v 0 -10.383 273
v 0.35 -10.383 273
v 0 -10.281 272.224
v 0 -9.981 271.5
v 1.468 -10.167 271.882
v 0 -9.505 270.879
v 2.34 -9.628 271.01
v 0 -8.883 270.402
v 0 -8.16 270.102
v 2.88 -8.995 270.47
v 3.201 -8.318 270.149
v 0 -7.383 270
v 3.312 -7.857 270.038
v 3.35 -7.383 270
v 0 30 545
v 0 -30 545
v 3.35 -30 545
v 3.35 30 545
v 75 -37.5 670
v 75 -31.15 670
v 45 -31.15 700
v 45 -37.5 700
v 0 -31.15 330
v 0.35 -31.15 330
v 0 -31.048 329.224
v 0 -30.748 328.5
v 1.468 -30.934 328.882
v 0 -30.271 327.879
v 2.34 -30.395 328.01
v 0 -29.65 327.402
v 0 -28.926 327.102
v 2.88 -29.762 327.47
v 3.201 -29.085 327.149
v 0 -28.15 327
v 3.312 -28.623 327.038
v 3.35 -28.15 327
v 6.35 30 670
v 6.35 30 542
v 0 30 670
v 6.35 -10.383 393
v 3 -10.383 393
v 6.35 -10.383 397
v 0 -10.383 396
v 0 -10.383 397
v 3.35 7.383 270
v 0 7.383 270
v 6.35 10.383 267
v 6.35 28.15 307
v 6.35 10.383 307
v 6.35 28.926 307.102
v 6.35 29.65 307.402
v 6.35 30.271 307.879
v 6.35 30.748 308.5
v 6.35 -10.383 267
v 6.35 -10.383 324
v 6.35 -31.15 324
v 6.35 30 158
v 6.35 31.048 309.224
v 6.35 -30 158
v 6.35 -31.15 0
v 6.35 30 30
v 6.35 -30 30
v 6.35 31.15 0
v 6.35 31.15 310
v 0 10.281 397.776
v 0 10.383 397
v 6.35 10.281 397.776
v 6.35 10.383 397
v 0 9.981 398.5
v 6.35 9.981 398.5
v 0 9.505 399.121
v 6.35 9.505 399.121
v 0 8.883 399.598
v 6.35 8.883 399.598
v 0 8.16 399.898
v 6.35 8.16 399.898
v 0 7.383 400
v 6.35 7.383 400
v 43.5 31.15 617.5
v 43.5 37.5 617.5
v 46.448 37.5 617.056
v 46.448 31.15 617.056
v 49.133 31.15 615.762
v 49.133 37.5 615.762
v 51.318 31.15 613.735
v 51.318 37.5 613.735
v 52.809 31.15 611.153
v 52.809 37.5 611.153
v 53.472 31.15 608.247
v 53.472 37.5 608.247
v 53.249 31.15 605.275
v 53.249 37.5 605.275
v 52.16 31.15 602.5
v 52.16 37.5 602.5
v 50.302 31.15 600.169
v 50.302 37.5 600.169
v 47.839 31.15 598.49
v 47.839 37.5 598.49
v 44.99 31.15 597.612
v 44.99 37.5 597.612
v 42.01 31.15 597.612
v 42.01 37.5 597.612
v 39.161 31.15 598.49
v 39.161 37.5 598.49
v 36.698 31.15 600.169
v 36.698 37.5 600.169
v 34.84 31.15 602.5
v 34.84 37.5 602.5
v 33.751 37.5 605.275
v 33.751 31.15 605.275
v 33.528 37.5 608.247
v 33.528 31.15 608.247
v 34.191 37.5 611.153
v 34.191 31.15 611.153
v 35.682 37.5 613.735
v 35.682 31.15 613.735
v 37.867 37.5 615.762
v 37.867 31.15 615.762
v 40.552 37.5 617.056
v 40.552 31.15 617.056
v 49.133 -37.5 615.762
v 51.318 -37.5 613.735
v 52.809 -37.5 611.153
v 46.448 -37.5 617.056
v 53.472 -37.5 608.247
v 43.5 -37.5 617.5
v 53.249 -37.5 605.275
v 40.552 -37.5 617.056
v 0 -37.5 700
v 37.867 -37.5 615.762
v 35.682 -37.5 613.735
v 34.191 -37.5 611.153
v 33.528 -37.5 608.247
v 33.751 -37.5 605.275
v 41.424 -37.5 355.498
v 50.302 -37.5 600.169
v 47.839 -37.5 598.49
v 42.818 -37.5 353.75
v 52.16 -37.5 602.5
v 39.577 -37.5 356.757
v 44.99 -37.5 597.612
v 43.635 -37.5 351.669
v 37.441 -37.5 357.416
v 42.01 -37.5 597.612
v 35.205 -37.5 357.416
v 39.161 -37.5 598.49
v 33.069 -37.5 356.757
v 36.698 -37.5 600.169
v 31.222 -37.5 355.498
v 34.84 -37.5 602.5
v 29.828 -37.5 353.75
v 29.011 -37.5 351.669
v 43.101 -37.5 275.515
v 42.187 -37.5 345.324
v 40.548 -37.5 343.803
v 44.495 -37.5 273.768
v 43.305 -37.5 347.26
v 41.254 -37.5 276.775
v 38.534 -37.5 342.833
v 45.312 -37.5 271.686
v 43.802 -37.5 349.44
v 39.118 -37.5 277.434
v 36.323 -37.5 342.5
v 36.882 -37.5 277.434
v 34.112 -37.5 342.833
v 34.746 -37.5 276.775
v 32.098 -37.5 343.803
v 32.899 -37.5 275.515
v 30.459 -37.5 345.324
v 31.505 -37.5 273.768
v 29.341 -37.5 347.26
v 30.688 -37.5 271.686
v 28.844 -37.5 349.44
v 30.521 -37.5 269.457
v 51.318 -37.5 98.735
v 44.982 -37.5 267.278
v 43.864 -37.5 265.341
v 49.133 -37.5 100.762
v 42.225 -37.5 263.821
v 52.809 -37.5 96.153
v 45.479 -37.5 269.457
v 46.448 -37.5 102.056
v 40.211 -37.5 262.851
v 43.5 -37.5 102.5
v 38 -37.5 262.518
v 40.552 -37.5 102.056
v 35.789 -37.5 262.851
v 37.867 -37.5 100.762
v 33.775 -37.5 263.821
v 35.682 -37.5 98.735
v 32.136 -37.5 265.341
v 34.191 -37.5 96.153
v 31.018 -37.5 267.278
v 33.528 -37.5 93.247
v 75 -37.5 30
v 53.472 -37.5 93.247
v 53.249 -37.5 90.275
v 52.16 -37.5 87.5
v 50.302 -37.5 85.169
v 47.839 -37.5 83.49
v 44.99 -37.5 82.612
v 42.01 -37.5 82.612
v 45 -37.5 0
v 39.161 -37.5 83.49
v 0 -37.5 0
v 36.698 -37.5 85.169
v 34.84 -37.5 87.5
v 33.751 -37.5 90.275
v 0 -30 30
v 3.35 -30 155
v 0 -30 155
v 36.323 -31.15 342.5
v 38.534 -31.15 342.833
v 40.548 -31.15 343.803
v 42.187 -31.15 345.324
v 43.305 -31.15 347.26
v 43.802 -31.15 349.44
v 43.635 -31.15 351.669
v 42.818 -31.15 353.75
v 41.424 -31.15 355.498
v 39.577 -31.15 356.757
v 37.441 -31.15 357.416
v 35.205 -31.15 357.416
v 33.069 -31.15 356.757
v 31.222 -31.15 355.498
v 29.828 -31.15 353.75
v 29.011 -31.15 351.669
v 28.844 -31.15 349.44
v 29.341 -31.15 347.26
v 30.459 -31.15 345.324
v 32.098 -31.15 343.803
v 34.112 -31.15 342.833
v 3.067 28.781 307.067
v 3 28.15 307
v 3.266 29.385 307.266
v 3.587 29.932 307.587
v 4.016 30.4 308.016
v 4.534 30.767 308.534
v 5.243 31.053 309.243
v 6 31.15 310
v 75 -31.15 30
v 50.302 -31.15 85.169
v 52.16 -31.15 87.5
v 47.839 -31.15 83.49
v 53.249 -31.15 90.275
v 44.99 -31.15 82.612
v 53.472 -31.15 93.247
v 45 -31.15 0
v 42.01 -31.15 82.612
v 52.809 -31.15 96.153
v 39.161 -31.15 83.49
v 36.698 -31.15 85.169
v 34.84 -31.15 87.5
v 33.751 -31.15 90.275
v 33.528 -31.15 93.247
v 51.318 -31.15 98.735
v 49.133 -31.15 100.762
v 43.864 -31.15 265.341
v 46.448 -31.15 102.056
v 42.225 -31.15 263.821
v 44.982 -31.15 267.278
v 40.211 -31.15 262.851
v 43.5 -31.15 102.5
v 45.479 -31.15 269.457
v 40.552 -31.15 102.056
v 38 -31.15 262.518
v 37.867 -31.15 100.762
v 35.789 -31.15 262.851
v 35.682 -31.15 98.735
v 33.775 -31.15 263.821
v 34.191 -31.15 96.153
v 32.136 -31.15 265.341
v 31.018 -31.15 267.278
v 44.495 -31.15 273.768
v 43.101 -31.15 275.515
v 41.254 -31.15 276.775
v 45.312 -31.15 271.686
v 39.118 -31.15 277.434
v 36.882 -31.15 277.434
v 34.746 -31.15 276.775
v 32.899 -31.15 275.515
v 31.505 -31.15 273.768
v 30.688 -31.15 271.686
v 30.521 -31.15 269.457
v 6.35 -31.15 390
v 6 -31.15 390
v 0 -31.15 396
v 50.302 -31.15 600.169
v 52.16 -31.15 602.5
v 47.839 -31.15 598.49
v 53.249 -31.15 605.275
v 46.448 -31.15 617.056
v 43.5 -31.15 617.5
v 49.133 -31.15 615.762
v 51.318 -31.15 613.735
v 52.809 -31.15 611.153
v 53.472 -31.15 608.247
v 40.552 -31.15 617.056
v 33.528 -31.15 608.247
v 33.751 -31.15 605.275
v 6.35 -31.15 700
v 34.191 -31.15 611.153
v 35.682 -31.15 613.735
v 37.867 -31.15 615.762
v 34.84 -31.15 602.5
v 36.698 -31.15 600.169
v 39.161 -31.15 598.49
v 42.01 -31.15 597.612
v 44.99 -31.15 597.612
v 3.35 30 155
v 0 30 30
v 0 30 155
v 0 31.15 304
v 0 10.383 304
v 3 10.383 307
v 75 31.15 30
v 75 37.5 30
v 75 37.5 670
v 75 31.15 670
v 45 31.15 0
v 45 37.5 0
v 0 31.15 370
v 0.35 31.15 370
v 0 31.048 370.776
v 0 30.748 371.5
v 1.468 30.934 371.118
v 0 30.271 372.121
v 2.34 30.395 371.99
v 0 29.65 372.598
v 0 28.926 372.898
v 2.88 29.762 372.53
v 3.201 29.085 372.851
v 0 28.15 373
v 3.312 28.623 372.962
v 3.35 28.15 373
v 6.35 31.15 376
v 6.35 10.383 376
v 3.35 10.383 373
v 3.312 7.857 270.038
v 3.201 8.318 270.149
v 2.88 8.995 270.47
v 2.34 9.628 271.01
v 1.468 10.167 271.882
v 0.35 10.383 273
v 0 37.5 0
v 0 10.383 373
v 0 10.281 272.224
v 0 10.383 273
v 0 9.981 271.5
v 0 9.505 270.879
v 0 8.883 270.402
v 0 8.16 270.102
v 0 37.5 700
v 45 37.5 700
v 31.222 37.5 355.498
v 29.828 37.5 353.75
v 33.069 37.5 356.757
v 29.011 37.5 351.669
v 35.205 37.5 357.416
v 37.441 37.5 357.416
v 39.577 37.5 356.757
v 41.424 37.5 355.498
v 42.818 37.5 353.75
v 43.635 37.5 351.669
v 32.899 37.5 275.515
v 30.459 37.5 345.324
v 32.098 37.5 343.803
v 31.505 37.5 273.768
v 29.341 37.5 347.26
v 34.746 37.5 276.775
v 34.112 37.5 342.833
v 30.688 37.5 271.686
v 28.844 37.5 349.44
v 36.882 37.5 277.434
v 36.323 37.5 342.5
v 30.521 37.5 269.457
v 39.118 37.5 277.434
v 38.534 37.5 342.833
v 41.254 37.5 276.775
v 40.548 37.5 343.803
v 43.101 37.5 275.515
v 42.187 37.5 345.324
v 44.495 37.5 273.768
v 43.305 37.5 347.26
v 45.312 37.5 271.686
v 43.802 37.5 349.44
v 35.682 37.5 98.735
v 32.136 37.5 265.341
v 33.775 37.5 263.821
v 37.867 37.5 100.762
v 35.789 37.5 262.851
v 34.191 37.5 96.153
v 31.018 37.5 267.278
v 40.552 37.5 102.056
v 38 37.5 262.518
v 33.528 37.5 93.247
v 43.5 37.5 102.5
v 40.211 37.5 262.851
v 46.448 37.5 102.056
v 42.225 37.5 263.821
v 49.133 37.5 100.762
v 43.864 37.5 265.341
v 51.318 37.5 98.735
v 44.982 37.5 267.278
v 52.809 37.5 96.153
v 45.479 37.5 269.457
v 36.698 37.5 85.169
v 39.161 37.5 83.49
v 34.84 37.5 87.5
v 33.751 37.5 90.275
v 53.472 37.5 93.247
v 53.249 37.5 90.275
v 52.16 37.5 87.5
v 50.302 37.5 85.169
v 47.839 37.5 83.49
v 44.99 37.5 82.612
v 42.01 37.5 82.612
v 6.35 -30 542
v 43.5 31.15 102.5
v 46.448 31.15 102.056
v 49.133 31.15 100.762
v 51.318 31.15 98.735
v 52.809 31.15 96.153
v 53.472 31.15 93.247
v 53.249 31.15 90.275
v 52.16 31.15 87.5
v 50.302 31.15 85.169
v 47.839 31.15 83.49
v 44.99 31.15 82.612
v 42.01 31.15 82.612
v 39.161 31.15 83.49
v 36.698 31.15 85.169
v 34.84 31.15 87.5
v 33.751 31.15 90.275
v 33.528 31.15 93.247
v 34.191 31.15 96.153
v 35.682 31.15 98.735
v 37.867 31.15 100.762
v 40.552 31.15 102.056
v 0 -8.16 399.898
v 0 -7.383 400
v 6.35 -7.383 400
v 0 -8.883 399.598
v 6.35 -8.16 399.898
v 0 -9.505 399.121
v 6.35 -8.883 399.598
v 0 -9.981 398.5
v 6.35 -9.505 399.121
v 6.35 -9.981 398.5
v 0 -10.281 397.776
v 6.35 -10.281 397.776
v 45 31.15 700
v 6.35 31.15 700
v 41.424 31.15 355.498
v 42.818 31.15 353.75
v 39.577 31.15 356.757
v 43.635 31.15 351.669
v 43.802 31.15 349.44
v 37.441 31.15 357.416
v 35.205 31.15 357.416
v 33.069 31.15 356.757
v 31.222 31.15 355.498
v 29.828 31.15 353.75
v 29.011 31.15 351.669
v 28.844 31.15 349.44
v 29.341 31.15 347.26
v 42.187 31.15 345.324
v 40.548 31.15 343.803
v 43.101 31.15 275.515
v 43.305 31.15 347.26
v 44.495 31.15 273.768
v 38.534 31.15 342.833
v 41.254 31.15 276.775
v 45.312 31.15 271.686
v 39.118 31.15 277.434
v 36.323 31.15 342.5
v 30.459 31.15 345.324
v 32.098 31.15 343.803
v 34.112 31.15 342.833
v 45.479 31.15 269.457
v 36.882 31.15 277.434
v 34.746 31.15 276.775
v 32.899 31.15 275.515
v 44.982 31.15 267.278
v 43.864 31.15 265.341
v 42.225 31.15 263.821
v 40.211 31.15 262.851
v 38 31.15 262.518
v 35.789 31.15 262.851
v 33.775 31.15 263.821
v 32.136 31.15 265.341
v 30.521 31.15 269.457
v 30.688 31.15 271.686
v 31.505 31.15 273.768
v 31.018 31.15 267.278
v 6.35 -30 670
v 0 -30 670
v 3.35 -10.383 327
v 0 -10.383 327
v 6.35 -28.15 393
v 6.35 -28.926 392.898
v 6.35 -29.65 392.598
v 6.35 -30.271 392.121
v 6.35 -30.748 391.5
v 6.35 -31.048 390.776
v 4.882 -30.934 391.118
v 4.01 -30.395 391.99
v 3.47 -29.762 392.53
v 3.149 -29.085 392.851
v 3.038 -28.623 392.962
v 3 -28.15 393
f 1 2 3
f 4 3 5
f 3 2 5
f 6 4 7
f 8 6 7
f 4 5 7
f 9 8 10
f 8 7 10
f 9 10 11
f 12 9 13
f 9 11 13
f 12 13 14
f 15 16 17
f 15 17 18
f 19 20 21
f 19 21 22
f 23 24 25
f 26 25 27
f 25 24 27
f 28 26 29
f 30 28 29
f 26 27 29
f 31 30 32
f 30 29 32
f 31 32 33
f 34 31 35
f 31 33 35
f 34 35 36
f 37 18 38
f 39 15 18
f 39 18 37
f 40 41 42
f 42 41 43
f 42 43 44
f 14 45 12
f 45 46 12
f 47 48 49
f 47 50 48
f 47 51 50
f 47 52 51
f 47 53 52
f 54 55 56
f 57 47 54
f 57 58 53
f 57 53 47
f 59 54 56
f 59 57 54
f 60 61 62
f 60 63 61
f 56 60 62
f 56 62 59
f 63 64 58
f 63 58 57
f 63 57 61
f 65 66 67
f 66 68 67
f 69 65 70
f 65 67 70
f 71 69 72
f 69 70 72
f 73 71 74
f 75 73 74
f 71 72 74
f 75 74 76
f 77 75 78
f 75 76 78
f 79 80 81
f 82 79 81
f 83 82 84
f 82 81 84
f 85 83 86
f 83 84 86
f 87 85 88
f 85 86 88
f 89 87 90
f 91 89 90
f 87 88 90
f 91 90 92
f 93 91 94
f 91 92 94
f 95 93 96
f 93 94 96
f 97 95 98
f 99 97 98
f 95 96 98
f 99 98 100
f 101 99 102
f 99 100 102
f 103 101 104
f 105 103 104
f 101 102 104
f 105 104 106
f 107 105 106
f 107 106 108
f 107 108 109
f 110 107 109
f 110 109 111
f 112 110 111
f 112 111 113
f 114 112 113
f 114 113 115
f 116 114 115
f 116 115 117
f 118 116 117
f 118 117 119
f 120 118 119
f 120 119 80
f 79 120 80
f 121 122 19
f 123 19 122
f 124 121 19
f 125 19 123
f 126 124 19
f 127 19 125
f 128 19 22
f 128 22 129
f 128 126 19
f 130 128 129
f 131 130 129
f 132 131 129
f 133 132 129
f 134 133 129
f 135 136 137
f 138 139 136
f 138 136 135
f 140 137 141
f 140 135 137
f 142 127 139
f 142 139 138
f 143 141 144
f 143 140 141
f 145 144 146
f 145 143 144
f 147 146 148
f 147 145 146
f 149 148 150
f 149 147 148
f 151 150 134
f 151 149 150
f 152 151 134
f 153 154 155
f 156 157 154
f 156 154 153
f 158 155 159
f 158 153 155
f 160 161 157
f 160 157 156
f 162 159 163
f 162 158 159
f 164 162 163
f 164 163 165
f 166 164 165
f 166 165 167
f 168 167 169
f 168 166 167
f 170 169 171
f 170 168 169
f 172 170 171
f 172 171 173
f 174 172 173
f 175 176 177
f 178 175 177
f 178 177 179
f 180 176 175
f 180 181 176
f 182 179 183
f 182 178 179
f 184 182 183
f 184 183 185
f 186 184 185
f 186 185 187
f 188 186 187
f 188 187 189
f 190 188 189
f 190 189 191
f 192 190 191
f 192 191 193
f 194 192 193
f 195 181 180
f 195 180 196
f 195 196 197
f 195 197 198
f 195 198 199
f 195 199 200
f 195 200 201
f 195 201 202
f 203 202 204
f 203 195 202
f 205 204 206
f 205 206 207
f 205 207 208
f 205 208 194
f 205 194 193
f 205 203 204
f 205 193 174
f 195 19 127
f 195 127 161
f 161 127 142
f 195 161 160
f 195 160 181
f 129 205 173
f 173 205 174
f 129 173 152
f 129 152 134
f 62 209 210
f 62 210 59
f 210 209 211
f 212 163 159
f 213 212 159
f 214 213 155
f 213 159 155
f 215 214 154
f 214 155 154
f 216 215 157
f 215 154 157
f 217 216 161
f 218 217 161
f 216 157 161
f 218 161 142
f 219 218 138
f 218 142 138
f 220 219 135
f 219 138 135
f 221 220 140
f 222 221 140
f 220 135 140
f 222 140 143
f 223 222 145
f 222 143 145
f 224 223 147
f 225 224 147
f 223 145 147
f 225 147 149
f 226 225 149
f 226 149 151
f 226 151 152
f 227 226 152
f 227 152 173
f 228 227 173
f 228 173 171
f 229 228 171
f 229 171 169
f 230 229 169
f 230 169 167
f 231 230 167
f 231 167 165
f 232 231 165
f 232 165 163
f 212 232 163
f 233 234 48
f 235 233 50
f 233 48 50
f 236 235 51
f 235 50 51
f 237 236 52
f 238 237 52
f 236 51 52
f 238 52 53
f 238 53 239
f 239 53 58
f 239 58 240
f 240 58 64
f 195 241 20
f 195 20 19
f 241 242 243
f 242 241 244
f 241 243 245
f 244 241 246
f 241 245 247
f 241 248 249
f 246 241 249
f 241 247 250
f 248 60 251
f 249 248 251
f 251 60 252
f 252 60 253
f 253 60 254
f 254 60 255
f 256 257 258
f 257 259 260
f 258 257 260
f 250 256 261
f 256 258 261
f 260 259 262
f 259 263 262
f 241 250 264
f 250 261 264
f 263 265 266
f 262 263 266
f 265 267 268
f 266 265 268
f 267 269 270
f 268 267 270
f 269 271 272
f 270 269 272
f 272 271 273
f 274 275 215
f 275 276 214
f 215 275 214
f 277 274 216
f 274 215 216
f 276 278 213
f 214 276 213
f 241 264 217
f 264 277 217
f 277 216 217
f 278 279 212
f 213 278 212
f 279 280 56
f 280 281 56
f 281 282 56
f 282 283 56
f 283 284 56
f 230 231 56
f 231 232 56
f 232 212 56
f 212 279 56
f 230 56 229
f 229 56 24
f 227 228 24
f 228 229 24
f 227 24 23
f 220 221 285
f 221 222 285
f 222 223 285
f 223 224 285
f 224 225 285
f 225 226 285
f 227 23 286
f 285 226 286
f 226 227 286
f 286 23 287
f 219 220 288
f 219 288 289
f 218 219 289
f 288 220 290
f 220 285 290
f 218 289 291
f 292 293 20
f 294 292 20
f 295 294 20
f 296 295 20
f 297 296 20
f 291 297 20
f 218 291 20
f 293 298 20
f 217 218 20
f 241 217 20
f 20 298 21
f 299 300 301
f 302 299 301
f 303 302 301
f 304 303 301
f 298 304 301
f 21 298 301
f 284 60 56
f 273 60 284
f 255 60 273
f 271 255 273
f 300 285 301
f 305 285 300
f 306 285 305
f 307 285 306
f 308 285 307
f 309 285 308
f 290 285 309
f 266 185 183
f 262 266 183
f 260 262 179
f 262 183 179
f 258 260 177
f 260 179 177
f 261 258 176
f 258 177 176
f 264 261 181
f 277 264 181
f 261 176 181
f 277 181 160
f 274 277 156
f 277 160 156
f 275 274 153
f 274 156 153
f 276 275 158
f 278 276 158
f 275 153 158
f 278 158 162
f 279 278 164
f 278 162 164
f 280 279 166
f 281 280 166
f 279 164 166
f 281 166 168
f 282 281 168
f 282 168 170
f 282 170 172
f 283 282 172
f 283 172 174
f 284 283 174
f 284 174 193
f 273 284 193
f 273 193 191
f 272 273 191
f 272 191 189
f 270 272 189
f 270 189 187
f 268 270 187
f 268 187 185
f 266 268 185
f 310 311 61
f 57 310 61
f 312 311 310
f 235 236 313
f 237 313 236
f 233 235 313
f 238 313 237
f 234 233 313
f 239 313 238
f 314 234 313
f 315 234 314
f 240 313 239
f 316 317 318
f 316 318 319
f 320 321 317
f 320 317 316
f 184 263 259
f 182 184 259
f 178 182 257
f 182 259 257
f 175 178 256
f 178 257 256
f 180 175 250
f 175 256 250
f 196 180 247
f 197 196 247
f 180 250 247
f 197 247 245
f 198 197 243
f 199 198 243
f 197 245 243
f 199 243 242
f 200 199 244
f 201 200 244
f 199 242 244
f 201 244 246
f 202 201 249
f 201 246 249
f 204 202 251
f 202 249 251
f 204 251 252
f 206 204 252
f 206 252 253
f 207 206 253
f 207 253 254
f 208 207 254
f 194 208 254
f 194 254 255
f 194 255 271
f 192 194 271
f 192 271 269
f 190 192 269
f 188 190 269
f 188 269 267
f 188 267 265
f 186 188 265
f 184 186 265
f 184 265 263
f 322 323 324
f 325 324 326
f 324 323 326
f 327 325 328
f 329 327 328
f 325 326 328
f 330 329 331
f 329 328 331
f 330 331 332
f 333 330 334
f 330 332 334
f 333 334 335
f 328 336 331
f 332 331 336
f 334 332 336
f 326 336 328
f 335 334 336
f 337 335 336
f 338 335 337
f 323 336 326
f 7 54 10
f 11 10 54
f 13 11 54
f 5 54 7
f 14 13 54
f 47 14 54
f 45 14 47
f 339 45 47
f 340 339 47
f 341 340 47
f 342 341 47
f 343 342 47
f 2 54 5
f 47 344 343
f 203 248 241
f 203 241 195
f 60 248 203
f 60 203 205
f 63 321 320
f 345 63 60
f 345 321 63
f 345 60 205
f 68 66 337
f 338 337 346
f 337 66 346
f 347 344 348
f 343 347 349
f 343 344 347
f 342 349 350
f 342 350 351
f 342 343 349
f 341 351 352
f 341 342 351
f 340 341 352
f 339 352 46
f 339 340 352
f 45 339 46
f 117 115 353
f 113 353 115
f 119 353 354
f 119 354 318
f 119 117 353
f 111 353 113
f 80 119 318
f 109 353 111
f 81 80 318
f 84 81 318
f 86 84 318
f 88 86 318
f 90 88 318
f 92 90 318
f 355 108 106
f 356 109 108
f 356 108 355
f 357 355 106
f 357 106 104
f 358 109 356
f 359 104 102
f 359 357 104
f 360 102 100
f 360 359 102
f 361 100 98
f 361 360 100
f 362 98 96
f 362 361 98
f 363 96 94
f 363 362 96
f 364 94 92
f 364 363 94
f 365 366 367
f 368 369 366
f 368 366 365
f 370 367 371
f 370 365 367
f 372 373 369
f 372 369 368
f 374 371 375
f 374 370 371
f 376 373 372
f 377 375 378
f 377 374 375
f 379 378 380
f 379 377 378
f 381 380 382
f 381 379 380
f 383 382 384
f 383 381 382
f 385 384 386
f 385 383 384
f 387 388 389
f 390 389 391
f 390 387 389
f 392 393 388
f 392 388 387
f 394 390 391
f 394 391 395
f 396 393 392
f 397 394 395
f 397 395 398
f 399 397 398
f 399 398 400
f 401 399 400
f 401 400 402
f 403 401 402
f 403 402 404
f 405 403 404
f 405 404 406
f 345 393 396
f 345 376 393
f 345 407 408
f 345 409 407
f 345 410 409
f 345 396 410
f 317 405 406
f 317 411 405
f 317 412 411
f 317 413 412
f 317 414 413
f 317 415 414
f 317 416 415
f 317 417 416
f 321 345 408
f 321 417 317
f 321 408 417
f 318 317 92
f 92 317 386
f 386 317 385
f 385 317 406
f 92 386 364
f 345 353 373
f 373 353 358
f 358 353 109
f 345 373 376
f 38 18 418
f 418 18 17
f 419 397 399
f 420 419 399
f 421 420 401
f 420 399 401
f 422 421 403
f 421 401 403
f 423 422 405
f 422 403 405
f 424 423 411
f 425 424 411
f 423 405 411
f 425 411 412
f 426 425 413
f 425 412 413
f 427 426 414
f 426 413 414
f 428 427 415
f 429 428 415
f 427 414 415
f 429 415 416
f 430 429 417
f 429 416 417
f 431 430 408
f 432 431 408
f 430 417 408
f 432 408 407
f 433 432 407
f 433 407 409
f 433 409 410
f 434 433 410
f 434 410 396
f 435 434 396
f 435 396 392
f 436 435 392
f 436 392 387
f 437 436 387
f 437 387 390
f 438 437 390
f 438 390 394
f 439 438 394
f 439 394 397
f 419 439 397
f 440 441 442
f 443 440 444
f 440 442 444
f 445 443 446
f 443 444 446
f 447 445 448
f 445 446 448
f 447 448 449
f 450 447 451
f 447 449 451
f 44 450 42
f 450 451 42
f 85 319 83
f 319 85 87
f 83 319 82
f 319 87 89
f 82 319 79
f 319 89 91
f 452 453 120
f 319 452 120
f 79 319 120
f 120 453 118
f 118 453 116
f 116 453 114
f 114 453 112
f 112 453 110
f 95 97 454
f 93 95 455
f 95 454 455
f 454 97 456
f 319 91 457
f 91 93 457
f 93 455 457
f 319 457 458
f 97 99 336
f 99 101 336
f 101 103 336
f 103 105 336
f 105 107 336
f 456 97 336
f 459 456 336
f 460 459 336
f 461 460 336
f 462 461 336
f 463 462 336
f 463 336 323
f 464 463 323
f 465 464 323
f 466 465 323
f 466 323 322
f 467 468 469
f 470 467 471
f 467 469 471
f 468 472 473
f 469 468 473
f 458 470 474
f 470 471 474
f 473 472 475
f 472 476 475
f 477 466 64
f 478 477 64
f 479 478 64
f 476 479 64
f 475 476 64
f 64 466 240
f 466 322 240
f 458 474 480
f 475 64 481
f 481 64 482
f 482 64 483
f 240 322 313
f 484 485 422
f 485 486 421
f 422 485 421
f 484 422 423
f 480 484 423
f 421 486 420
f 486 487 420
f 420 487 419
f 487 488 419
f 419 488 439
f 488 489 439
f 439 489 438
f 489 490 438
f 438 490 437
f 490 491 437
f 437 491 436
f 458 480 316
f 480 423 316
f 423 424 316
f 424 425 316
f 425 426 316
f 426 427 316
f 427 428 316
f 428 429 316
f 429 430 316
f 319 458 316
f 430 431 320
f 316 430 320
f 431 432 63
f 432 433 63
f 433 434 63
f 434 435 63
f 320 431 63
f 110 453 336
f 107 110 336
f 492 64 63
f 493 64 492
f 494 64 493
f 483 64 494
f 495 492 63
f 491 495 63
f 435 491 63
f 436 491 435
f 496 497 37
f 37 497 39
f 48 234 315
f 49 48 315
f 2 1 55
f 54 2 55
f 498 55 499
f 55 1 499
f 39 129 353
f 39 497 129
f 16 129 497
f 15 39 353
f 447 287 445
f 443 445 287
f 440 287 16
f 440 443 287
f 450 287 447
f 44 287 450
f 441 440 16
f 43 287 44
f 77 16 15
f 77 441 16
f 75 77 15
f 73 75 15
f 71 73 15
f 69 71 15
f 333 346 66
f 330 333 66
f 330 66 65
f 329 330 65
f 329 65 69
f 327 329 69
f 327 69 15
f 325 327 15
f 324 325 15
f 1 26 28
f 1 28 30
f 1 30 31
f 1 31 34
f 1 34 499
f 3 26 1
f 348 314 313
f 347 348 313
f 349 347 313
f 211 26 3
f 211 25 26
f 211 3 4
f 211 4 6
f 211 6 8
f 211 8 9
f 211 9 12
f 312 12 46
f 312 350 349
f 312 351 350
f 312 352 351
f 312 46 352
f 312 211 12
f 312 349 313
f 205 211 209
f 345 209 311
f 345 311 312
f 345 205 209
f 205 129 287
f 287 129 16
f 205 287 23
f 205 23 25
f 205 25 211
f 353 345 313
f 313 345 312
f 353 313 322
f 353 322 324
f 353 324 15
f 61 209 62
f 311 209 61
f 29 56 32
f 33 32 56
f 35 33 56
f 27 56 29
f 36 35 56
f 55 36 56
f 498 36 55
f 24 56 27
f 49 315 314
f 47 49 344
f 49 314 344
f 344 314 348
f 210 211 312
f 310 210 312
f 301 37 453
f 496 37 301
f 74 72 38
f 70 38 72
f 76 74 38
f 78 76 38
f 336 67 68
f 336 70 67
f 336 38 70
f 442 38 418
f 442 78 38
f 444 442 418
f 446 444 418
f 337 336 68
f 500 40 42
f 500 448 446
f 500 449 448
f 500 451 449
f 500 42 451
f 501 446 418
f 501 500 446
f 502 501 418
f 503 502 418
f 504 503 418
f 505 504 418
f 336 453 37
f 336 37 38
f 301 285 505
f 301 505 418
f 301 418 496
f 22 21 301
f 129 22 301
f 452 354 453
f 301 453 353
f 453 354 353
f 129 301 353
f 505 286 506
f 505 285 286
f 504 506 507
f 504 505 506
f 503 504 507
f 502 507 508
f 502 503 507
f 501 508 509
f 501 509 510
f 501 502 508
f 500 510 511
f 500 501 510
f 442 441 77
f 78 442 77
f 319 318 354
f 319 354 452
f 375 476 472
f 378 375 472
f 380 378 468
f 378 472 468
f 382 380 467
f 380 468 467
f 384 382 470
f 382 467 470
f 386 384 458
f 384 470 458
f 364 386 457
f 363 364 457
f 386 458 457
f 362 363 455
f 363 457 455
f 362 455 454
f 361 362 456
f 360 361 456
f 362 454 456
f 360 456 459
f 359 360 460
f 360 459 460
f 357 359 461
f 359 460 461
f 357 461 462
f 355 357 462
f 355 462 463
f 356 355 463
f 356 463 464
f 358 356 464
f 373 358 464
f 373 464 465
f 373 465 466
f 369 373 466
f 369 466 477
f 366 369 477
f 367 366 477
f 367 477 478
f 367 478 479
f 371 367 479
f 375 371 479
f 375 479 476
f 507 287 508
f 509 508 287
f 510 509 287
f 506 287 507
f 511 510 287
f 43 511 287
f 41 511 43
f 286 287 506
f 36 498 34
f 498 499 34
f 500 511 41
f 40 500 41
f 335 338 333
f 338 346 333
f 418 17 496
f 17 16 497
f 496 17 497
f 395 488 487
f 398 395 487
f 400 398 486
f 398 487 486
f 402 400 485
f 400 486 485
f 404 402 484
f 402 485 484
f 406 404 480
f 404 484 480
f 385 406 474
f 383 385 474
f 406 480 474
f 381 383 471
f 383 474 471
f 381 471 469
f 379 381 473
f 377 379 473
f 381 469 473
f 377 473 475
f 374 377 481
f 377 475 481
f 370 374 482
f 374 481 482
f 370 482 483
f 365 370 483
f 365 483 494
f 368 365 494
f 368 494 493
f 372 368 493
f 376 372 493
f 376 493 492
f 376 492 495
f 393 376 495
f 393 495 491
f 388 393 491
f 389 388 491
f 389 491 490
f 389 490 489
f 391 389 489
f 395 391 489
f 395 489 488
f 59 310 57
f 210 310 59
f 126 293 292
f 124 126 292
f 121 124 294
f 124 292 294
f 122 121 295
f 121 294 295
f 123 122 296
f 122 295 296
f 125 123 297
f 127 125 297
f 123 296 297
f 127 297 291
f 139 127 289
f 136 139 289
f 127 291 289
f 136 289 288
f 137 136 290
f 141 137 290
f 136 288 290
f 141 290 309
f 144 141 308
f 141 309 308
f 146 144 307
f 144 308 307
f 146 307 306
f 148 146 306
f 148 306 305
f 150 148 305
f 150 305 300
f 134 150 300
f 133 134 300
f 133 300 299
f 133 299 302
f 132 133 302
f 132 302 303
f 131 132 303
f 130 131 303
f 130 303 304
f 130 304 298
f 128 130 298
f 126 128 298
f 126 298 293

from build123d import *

# Parameters (mm, degrees)
BOSS_EXTRUDE1_DEPTH = 700
SKETCH3_W           = 125
SKETCH3_H           = 60
CUT_EXTRUDE1_DEPTH  = 706.00443261
CHAMFER1_SIZE       = 30
SKETCH4_R           = 10
CUT_EXTRUDE2_DEPTH  = 708.990112925
SKETCH5_R           = 7.5
CUT_EXTRUDE3_DEPTH  = 708.990112925
CHAMFER2_SIZE       = 3
FILLET1_R           = 3


with BuildPart() as part:
    # Sketch1 → Boss-Extrude1 (new body)
    with BuildSketch(Plane.XY):
        Polygon((0, -37.5), (0, 37.5), (75, 37.5), (75, 31.15), (6.35, 31.15), (6.35, -31.15), (75, -31.15), (75, -37.5), align=None)
    extrude(amount=BOSS_EXTRUDE1_DEPTH)

    # Sketch3 → Cut-Extrude1 (cut, through all)
    with BuildSketch(Plane.ZY):
        with Locations((92.5, 0)):
            Rectangle(SKETCH3_W, SKETCH3_H)
        with Locations((607.5, 0)):
            Rectangle(SKETCH3_W, SKETCH3_H)
        Polygon((400, 10.383333333), (373, 10.383333333), (373, 31.15), (327, 31.15), (307, 31.15), (307, 10.383333333), (300, 10.383333333), (270, 10.383333333), (270, -10.383333333), (300, -10.383333333), (327, -10.383333333), (327, -31.15), (373, -31.15), (393, -31.15), (393, -10.383333333), (400, -10.383333333), align=None)
    extrude(amount=-CUT_EXTRUDE1_DEPTH, mode=Mode.SUBTRACT)

    # Chamfer1
    chamfer1_edges = [part.edges().sort_by_distance(p)[0] for p in [
        (75, -34.325, 0),
        (75, 34.325, 700),
        (75, -34.325, 700),
        (75, 34.325, 0),
    ]]
    chamfer(chamfer1_edges, length=CHAMFER1_SIZE)

    # Sketch4 → Cut-Extrude2 (cut, through all)
    with BuildSketch(Plane(origin=(0, 37.5, 0), x_dir=(1, 0, 0), z_dir=(0, 1, 0))):
        with Locations(Location((43.5, -607.5, 0), (0, 0, 270))):
            Circle(SKETCH4_R)
        with Locations(Location((43.5, -92.5, 0), (0, 0, 270))):
            Circle(SKETCH4_R)
    extrude(amount=-CUT_EXTRUDE2_DEPTH, mode=Mode.SUBTRACT)

    # Sketch5 → Cut-Extrude3 (cut, through all)
    with BuildSketch(Plane.XZ.offset(37.5)):
        with Locations(Location((38, 270.017579968, 0), (0, 0, 270))):
            Circle(SKETCH5_R)
        with Locations(Location((36.322953254, 350, 0), (0, 0, 270))):
            Circle(SKETCH5_R)
    extrude(amount=-CUT_EXTRUDE3_DEPTH, mode=Mode.SUBTRACT)

    # Chamfer2
    chamfer2_edges = [part.edges().sort_by_distance(p)[0] for p in [
        (6.35, 0, 155),
        (6.35, 0, 545),
        (6.35, -20.766666667, 327),
        (6.35, 0, 270),
        (6.35, 20.766666667, 373),
        (0, -20.766666667, 393),
        (0, 20.766666667, 307),
    ]]
    chamfer(chamfer2_edges, length=CHAMFER2_SIZE)

    # Fillet1
    fillet1_edges = [part.edges().sort_by_distance(p)[0] for p in [
        (1.675, 10.383333333, 270),
        (1.675, -10.383333333, 270),
        (1.675, 31.15, 373),
        (1.675, -31.15, 327),
        (4.675, -31.15, 393),
        (4.675, 31.15, 307),
        (3.175, 10.383333333, 400),
        (3.175, -10.383333333, 400),
    ]]
    fillet(fillet1_edges, radius=FILLET1_R)


solid = part.part
